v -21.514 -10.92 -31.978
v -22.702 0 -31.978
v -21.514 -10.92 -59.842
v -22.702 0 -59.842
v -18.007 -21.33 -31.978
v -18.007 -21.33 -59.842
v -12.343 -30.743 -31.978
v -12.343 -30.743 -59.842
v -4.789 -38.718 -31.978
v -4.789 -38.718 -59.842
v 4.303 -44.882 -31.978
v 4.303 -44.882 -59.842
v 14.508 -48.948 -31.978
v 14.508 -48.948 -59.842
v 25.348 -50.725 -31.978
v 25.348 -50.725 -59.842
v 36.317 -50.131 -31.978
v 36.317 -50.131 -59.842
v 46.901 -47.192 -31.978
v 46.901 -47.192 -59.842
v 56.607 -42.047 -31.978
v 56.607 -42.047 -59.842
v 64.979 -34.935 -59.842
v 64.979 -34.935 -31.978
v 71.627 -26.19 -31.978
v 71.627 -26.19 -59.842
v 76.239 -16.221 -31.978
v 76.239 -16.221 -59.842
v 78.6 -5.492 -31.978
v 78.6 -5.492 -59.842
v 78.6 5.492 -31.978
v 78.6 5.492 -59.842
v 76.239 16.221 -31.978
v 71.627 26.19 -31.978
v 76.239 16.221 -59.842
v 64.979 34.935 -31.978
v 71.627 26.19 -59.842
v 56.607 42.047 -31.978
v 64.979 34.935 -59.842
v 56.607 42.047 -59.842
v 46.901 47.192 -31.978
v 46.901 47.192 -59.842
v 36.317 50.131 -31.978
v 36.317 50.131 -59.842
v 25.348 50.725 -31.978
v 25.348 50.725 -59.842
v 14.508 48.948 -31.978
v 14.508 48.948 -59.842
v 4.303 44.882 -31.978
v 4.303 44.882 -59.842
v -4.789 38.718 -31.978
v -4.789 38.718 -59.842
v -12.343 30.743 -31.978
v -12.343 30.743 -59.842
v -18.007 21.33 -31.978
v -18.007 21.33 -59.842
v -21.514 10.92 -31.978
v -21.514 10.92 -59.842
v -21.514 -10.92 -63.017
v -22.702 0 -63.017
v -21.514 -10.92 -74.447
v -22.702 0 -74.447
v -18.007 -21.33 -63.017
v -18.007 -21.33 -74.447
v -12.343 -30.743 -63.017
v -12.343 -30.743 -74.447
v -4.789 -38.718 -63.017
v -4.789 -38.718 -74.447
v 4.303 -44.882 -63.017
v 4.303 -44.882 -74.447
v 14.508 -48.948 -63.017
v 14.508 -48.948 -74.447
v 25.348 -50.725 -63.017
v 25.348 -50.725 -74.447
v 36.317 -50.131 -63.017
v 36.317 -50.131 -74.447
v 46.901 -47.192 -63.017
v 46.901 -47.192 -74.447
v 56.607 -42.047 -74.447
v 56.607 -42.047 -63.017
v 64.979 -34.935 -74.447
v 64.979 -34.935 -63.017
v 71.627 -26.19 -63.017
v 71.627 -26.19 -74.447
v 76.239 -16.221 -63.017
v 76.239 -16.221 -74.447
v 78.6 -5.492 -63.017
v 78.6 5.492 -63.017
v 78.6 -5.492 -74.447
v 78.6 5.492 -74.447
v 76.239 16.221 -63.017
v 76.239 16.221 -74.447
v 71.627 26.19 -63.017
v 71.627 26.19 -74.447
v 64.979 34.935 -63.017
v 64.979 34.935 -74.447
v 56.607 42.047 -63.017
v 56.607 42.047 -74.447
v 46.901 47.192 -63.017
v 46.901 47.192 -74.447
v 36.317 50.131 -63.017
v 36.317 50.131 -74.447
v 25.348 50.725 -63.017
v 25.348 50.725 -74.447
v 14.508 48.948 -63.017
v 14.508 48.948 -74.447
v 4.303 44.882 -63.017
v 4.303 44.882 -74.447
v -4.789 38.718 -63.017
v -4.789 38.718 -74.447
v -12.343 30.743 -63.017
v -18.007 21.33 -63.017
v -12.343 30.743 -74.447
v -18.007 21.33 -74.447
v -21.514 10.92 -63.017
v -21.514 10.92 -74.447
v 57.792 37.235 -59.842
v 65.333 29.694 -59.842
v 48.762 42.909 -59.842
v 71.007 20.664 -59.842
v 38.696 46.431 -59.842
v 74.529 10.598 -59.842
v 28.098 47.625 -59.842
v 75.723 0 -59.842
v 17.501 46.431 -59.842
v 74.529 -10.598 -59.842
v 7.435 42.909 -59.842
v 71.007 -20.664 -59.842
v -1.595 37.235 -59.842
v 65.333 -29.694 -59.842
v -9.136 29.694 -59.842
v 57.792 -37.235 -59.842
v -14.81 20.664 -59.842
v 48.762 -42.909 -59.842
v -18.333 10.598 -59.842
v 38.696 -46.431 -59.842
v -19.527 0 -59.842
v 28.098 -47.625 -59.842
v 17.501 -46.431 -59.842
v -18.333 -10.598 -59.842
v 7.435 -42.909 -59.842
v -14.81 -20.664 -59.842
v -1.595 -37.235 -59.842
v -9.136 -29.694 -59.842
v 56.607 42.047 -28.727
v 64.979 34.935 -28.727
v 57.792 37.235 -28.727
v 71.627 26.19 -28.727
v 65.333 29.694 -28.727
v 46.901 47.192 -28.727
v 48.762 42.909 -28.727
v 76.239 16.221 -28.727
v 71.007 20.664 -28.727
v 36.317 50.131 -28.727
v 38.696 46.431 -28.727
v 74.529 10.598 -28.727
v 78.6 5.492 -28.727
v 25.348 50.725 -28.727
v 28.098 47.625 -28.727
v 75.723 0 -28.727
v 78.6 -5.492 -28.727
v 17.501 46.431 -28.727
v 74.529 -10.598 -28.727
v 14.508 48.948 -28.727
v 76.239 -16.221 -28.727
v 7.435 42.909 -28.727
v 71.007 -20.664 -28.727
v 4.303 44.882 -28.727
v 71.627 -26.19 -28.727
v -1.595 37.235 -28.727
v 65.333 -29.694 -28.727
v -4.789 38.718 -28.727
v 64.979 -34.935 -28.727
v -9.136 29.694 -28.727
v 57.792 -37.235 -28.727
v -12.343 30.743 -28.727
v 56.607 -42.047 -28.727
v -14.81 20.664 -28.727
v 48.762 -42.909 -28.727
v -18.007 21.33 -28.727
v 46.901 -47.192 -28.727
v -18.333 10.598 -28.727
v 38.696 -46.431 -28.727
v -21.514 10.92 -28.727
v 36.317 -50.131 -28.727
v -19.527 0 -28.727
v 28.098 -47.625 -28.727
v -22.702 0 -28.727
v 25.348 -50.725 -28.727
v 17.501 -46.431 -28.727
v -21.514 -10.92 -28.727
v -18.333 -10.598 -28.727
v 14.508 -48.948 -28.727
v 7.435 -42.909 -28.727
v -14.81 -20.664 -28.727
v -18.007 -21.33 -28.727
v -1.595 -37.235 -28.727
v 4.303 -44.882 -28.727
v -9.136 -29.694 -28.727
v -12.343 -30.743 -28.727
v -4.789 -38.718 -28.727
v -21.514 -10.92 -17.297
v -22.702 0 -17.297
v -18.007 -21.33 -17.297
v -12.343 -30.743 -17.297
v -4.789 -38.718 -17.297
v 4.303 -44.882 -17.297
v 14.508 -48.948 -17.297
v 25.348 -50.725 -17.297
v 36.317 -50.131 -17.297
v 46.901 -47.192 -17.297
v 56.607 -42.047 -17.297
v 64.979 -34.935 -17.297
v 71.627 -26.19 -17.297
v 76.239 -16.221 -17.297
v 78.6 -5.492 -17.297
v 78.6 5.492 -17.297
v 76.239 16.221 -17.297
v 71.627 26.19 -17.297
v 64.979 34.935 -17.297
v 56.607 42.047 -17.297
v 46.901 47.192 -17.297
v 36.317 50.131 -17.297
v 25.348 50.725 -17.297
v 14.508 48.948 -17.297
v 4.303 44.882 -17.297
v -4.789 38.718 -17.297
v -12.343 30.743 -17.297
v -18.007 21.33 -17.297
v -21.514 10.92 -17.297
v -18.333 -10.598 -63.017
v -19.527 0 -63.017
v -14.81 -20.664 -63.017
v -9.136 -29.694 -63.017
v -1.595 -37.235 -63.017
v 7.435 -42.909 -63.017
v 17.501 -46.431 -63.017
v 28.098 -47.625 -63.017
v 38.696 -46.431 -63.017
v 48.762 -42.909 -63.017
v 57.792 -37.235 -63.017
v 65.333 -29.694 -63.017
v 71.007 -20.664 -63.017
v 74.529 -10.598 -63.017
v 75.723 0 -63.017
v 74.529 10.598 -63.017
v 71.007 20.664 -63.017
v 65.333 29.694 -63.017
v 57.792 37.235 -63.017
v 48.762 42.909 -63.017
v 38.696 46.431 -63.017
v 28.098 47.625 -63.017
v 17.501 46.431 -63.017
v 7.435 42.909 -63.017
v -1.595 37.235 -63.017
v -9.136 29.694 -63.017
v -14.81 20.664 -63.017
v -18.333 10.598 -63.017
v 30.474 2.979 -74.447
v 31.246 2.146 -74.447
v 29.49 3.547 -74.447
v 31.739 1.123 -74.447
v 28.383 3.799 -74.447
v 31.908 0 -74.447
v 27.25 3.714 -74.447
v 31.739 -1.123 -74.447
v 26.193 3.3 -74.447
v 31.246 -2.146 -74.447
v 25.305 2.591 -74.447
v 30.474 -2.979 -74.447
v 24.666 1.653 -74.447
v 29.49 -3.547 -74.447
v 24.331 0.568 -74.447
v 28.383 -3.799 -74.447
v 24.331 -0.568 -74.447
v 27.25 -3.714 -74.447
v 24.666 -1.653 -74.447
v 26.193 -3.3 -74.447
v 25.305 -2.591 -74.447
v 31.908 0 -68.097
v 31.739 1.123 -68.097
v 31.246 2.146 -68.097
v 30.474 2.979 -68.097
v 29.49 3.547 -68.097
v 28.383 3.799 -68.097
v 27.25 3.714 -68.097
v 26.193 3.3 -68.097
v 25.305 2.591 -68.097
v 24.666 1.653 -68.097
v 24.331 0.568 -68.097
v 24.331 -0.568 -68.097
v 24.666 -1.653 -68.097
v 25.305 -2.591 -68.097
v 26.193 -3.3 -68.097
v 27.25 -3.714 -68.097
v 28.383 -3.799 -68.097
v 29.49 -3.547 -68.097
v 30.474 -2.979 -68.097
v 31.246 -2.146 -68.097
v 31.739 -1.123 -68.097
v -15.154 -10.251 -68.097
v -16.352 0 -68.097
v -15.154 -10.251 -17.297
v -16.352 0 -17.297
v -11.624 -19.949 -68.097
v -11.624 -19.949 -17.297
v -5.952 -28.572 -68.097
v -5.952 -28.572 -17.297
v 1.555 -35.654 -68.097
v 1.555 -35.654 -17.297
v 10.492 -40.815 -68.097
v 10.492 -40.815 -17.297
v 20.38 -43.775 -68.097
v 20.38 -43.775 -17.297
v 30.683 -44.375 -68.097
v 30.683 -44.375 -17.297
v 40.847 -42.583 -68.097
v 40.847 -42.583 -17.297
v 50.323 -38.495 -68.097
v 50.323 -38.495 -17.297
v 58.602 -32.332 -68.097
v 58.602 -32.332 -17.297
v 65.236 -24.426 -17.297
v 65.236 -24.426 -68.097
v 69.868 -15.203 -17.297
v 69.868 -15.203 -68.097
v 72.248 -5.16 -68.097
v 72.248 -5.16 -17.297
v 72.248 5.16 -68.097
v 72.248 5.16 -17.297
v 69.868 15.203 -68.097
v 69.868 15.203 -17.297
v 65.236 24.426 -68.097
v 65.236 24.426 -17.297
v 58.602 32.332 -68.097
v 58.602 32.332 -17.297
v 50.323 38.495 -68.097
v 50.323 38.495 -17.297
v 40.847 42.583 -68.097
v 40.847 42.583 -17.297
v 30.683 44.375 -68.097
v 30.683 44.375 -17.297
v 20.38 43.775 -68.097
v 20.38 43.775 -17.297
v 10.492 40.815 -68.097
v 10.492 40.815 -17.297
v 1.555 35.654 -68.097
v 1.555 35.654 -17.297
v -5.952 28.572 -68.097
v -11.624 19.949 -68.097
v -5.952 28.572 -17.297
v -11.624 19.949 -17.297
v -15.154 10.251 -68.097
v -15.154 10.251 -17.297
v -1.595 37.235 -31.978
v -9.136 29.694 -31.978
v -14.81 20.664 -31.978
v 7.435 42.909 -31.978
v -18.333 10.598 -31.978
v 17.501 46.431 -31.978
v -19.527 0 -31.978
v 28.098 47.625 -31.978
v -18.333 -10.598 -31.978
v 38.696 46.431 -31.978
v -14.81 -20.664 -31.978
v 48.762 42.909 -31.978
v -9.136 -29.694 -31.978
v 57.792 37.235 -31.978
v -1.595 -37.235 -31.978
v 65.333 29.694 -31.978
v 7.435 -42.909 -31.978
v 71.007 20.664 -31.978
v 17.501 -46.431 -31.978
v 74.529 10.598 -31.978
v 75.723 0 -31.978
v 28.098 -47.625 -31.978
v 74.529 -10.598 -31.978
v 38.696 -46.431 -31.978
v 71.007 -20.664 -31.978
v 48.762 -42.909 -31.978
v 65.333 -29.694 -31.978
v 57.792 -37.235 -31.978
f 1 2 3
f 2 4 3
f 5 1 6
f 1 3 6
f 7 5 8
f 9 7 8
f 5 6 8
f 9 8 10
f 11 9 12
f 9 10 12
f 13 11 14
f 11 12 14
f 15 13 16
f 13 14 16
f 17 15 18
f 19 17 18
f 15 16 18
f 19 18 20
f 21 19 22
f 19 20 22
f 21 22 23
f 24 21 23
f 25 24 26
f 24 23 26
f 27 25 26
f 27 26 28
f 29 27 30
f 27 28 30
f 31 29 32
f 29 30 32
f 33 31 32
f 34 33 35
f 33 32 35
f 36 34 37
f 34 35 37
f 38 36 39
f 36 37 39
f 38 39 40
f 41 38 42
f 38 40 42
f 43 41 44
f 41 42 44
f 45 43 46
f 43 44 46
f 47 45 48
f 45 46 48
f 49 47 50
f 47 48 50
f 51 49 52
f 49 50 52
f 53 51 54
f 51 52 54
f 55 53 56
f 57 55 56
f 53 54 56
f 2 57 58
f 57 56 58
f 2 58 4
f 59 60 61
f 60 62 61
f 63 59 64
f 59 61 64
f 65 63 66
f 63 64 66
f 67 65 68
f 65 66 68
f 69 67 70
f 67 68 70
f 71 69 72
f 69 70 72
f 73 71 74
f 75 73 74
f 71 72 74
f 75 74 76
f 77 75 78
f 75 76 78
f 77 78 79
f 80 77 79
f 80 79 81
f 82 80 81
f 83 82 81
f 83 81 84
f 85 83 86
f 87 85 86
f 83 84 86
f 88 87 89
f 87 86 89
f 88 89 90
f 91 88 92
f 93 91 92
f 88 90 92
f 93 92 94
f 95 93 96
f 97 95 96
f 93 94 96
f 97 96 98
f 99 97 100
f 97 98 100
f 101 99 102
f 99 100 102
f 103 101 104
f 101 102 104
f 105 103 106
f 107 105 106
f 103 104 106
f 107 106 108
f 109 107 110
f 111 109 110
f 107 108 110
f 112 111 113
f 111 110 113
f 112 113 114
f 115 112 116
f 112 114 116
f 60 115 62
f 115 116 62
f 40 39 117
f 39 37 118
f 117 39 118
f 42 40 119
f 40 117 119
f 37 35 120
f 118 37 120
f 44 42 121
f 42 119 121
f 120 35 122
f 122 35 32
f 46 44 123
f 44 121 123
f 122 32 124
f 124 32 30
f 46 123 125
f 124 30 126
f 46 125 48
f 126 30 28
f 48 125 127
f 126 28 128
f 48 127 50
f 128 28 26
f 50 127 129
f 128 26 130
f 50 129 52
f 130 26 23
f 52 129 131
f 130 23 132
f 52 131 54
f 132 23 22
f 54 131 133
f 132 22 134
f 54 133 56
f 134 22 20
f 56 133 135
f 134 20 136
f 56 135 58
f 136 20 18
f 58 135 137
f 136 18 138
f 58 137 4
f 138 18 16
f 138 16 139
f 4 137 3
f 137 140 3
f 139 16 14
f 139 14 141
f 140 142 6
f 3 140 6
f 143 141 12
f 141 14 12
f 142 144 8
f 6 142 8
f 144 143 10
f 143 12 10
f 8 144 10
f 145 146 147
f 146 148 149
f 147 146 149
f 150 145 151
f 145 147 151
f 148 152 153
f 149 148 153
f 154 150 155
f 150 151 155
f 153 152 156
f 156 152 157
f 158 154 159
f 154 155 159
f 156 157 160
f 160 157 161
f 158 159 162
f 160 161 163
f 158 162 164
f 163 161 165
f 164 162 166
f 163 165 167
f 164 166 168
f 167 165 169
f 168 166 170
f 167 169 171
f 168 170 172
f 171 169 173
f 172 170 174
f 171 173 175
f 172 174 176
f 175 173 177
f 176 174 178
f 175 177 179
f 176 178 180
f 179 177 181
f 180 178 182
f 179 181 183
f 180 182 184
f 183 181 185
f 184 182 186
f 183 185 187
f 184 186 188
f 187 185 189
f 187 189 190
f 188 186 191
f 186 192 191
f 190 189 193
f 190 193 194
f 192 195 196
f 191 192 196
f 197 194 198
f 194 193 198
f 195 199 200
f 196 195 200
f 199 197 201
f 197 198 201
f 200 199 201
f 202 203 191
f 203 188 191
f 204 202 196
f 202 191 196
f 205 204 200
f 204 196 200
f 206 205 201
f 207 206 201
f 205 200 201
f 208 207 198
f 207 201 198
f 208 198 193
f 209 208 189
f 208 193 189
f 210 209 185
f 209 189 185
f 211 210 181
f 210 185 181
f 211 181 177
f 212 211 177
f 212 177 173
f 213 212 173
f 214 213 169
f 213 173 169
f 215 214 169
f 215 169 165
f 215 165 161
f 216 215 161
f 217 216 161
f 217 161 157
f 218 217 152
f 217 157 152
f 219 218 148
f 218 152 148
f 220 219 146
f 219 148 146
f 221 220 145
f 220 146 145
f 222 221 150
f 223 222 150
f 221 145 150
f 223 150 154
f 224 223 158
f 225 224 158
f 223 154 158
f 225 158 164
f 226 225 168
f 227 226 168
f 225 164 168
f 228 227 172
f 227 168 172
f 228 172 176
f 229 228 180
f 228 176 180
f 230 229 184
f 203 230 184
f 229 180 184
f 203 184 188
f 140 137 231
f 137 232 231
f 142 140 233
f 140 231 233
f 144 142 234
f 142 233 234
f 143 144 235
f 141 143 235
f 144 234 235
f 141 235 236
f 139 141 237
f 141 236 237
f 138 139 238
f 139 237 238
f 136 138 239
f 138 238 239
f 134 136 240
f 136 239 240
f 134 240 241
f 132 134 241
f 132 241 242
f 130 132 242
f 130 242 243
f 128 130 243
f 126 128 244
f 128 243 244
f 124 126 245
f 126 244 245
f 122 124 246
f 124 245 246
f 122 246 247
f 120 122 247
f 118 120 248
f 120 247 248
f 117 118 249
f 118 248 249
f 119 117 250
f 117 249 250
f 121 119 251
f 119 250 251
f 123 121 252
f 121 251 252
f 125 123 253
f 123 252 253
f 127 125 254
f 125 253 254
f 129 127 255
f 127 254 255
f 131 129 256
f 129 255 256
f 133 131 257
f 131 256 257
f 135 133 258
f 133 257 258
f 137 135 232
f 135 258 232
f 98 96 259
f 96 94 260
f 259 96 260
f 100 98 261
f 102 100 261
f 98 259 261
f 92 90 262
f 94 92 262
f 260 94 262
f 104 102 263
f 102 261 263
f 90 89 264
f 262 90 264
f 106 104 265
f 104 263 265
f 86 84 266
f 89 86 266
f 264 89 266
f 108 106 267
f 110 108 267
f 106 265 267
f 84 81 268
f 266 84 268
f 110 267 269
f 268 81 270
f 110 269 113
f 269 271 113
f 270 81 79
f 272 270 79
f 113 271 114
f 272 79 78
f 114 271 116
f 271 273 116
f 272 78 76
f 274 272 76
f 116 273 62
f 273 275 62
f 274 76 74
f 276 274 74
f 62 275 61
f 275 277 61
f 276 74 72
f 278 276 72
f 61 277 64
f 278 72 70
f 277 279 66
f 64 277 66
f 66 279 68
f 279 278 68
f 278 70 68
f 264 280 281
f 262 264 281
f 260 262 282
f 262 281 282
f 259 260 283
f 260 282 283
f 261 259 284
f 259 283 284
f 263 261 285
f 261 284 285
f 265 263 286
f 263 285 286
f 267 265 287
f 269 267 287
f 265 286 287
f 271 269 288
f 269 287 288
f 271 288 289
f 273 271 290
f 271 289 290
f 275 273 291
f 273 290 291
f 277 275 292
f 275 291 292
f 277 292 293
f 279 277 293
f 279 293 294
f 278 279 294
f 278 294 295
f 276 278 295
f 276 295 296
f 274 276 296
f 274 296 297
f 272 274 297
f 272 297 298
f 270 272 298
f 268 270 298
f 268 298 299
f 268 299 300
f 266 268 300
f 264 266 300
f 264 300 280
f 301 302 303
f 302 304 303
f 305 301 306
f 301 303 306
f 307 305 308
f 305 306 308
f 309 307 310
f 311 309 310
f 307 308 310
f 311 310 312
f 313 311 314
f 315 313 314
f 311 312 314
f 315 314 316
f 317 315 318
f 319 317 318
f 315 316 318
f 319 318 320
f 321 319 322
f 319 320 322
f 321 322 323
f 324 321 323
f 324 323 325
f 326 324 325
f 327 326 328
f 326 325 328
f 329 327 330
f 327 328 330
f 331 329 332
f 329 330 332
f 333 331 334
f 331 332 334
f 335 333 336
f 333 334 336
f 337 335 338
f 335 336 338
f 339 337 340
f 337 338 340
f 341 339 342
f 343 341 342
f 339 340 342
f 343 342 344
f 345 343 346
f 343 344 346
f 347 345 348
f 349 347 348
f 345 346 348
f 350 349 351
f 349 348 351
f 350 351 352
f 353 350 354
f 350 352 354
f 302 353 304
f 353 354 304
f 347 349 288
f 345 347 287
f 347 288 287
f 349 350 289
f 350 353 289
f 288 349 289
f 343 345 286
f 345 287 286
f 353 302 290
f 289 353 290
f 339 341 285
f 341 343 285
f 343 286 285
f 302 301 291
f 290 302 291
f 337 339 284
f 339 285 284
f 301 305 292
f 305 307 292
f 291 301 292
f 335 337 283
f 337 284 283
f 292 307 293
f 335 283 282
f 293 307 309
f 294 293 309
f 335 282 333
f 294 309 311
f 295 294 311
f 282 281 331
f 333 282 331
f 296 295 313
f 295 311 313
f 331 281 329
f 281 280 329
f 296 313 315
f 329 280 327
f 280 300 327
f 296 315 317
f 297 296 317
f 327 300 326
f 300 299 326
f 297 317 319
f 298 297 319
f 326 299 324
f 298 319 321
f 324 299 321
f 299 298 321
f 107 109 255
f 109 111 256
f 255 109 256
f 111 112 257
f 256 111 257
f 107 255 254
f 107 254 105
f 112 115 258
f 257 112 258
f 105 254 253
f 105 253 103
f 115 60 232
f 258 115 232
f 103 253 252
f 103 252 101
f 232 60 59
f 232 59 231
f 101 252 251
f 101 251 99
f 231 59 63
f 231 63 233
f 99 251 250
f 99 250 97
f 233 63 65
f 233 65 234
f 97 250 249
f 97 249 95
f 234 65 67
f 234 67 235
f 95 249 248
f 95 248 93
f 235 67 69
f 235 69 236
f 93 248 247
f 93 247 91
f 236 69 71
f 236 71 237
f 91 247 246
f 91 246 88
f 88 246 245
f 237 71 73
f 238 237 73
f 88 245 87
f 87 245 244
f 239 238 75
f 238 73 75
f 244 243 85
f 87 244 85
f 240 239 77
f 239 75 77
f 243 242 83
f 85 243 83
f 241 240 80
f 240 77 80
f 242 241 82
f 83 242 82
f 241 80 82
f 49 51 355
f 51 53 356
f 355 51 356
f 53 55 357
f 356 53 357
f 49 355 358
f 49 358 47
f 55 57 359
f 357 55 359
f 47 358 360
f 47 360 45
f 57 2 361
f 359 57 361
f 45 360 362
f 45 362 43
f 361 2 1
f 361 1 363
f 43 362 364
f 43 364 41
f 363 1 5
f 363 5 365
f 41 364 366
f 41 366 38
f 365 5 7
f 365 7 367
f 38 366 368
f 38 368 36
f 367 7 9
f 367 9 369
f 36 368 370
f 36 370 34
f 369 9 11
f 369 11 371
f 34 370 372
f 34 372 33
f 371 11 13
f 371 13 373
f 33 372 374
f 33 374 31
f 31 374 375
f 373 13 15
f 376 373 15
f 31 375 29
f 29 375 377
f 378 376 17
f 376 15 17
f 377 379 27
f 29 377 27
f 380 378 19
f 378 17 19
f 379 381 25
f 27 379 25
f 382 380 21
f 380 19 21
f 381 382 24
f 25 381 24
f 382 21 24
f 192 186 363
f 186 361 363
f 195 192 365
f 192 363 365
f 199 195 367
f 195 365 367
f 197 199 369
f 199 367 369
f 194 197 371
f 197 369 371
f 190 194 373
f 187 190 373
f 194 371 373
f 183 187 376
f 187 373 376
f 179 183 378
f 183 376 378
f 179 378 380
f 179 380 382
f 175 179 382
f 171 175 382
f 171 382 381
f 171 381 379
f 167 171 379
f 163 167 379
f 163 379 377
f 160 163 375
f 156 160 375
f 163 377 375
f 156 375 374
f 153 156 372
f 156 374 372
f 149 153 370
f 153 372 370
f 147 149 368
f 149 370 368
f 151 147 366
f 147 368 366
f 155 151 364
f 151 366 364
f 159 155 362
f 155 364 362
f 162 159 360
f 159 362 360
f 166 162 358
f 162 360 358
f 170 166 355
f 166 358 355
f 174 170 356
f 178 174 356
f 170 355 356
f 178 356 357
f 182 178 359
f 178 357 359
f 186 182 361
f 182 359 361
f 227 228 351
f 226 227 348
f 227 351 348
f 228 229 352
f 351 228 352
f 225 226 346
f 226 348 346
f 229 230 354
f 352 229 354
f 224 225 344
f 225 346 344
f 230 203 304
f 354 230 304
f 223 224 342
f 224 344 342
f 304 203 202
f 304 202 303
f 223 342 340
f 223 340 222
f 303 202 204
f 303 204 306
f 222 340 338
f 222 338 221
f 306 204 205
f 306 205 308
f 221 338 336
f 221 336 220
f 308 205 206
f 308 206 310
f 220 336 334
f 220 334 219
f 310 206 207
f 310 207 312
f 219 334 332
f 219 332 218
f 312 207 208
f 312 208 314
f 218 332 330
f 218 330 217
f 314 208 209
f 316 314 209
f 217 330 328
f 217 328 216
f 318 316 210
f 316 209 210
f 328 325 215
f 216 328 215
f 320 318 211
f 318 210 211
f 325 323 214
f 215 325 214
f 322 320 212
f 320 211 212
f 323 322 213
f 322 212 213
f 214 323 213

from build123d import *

# Parameters (mm, degrees)
SKETCH3_R          = 3.81
CUT_EXTRUDE1_DEPTH = 107.706198127


with BuildPart() as part:
    # Sketch2 → Revolve1 (revolve)
    with BuildSketch(Plane(origin=(0, 0, 0), x_dir=(1, 0, 0), z_dir=(0, 1, 0))):
        Polygon((-16.351757188, 17.29715655), (-22.701757188, 17.29715655), (-22.701757188, 28.72715655), (-19.526757188, 28.72715655), (-19.526757188, 31.97835655), (-22.701757188, 31.97835655), (-22.701757188, 59.84215655), (-19.526757188, 59.84215655), (-19.526757188, 63.01715655), (-22.701757188, 63.01715655), (-22.701757188, 74.44715655), (28.098242812, 74.44715655), (28.098242812, 68.09715655), (-16.351757188, 68.09715655), align=None)
    revolve(axis=Axis((28.098242812, 0, -74.44715655), (0, 0, 1)))

    # Sketch3 → Cut-Extrude1 (cut, through all)
    with BuildSketch(Plane.XY.offset(-68.09715655)):
        with Locations((28.098242812, 0)):
            Circle(SKETCH3_R)
    extrude(amount=-CUT_EXTRUDE1_DEPTH, mode=Mode.SUBTRACT)


solid = part.part
